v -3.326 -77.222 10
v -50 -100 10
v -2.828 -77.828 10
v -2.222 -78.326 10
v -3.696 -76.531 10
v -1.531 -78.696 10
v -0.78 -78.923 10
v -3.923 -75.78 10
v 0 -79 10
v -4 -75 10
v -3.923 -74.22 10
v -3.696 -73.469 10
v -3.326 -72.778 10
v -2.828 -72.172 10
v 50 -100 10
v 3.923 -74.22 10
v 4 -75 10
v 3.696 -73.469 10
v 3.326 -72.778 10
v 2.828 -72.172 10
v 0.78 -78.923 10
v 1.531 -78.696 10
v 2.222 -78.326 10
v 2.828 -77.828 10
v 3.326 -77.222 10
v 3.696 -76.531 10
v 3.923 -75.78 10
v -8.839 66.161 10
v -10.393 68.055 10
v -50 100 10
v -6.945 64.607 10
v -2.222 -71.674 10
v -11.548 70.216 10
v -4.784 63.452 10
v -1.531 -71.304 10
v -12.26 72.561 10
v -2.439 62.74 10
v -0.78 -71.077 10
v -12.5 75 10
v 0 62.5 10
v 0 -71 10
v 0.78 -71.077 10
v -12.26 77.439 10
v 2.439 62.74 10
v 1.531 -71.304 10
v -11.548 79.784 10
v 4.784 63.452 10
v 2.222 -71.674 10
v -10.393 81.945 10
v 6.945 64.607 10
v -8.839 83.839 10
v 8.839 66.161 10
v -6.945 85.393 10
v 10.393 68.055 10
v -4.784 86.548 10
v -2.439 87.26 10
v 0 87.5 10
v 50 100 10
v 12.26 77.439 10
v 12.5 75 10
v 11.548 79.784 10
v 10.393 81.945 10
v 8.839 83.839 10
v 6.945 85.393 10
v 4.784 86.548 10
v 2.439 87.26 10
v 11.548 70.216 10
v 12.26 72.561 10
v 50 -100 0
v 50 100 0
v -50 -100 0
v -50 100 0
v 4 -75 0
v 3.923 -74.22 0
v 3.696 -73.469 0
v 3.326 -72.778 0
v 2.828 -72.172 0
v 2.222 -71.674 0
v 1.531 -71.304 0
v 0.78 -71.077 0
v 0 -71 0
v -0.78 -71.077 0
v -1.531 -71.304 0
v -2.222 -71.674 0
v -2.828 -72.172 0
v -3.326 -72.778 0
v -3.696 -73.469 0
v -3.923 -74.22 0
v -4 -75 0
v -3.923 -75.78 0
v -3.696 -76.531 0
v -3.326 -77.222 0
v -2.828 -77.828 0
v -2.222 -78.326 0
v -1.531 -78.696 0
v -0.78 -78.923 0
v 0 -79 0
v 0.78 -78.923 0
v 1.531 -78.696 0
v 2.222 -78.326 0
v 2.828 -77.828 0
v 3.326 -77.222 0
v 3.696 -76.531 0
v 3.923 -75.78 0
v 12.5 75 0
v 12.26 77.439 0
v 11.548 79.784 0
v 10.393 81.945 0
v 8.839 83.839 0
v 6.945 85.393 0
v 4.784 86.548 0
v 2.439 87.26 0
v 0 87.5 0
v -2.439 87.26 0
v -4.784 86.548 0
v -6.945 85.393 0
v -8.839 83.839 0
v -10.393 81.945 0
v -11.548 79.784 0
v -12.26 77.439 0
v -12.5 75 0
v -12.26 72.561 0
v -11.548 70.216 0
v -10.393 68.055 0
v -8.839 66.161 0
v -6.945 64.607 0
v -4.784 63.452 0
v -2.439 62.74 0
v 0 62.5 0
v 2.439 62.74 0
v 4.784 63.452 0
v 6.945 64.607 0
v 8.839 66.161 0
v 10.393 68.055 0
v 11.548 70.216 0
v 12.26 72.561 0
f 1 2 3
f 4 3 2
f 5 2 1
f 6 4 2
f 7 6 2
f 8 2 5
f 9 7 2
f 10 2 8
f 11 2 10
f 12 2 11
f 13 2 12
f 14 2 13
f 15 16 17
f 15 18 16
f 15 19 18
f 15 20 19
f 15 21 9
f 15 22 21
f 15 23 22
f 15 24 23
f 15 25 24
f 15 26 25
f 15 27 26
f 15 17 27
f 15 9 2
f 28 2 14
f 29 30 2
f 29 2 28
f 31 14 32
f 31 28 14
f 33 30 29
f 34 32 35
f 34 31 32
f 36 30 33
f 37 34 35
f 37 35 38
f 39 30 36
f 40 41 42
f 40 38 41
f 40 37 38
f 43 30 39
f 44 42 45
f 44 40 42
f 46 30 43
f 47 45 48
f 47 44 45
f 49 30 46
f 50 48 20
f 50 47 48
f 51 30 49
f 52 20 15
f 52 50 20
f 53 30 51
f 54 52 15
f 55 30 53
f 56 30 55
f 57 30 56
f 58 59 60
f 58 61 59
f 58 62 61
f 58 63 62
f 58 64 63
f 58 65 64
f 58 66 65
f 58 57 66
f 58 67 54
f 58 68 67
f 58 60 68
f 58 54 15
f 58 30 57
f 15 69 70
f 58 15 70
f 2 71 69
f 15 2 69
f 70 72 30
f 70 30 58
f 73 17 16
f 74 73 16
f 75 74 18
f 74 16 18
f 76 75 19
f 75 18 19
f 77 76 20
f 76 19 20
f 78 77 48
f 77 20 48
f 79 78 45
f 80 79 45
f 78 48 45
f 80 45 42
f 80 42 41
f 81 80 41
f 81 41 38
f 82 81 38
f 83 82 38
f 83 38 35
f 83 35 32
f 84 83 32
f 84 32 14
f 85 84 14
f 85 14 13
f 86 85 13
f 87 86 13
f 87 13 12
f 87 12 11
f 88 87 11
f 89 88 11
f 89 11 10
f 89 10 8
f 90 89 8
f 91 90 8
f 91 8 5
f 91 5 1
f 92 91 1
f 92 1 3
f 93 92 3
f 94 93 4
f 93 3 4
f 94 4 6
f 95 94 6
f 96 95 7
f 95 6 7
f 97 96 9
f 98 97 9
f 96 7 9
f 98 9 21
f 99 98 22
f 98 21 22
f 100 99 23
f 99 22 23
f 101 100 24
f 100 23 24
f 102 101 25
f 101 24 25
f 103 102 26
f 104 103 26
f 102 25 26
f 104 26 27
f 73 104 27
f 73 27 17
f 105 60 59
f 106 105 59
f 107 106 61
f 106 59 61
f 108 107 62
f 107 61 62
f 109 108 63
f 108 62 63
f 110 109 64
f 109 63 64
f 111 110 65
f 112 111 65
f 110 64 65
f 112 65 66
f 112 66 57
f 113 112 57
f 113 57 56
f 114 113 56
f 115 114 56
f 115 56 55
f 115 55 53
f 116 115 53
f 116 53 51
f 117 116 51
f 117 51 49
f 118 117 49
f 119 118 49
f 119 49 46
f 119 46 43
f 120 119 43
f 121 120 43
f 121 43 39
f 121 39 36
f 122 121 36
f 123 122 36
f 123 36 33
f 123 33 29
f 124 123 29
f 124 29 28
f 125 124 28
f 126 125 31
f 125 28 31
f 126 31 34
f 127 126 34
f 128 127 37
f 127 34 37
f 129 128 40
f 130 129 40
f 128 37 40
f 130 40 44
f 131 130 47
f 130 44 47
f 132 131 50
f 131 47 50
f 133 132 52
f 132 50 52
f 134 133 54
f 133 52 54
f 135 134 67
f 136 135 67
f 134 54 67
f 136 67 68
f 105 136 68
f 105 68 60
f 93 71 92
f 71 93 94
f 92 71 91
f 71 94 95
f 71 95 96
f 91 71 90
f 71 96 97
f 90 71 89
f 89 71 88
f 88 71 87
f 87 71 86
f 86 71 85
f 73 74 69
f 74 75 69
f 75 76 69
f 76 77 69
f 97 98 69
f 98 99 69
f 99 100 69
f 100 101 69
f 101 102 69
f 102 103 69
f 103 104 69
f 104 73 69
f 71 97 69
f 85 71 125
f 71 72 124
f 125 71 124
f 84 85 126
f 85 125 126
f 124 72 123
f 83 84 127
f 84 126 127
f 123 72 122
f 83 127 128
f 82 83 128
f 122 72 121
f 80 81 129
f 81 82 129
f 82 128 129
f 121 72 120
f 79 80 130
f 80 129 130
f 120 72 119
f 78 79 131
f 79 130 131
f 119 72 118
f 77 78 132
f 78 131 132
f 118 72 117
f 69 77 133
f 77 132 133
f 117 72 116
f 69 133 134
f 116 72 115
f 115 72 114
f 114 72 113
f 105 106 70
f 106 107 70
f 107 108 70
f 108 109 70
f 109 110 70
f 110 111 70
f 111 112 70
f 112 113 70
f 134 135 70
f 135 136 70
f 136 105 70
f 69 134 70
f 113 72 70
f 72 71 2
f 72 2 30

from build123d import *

# Parameters (mm, degrees)
SKETCH1_W           = 100
SKETCH1_H           = 200
BOSS_EXTRUDE1_DEPTH = 10
SKETCH3_R           = 4
CUT_EXTRUDE2_DEPTH  = 113.249721603
SKETCH4_R           = 4
CUT_EXTRUDE3_DEPTH  = 113.249721603
SKETCH5_R           = 12.5
CUT_EXTRUDE4_DEPTH  = 113.249721603


with BuildPart() as part:
    # Sketch1 → Boss-Extrude1 (new body)
    with BuildSketch(Plane.XY):
        Rectangle(SKETCH1_W, SKETCH1_H)
    extrude(amount=BOSS_EXTRUDE1_DEPTH)

    # Sketch3 → Cut-Extrude2 (cut, through all)
    with BuildSketch(Plane.XY.offset(10)):
        with Locations((0, -75)):
            Circle(SKETCH3_R)
    extrude(amount=-CUT_EXTRUDE2_DEPTH, mode=Mode.SUBTRACT)

    # Sketch4 → Cut-Extrude3 (cut, through all)
    with BuildSketch(Plane.XY.offset(10)):
        with Locations((0, 75)):
            Circle(SKETCH4_R)
    extrude(amount=-CUT_EXTRUDE3_DEPTH, mode=Mode.SUBTRACT)

    # Sketch5 → Cut-Extrude4 (cut, through all)
    with BuildSketch(Plane.XY.offset(10)):
        with Locations((0, 75)):
            Circle(SKETCH5_R)
    extrude(amount=-CUT_EXTRUDE4_DEPTH, mode=Mode.SUBTRACT)


solid = part.part
